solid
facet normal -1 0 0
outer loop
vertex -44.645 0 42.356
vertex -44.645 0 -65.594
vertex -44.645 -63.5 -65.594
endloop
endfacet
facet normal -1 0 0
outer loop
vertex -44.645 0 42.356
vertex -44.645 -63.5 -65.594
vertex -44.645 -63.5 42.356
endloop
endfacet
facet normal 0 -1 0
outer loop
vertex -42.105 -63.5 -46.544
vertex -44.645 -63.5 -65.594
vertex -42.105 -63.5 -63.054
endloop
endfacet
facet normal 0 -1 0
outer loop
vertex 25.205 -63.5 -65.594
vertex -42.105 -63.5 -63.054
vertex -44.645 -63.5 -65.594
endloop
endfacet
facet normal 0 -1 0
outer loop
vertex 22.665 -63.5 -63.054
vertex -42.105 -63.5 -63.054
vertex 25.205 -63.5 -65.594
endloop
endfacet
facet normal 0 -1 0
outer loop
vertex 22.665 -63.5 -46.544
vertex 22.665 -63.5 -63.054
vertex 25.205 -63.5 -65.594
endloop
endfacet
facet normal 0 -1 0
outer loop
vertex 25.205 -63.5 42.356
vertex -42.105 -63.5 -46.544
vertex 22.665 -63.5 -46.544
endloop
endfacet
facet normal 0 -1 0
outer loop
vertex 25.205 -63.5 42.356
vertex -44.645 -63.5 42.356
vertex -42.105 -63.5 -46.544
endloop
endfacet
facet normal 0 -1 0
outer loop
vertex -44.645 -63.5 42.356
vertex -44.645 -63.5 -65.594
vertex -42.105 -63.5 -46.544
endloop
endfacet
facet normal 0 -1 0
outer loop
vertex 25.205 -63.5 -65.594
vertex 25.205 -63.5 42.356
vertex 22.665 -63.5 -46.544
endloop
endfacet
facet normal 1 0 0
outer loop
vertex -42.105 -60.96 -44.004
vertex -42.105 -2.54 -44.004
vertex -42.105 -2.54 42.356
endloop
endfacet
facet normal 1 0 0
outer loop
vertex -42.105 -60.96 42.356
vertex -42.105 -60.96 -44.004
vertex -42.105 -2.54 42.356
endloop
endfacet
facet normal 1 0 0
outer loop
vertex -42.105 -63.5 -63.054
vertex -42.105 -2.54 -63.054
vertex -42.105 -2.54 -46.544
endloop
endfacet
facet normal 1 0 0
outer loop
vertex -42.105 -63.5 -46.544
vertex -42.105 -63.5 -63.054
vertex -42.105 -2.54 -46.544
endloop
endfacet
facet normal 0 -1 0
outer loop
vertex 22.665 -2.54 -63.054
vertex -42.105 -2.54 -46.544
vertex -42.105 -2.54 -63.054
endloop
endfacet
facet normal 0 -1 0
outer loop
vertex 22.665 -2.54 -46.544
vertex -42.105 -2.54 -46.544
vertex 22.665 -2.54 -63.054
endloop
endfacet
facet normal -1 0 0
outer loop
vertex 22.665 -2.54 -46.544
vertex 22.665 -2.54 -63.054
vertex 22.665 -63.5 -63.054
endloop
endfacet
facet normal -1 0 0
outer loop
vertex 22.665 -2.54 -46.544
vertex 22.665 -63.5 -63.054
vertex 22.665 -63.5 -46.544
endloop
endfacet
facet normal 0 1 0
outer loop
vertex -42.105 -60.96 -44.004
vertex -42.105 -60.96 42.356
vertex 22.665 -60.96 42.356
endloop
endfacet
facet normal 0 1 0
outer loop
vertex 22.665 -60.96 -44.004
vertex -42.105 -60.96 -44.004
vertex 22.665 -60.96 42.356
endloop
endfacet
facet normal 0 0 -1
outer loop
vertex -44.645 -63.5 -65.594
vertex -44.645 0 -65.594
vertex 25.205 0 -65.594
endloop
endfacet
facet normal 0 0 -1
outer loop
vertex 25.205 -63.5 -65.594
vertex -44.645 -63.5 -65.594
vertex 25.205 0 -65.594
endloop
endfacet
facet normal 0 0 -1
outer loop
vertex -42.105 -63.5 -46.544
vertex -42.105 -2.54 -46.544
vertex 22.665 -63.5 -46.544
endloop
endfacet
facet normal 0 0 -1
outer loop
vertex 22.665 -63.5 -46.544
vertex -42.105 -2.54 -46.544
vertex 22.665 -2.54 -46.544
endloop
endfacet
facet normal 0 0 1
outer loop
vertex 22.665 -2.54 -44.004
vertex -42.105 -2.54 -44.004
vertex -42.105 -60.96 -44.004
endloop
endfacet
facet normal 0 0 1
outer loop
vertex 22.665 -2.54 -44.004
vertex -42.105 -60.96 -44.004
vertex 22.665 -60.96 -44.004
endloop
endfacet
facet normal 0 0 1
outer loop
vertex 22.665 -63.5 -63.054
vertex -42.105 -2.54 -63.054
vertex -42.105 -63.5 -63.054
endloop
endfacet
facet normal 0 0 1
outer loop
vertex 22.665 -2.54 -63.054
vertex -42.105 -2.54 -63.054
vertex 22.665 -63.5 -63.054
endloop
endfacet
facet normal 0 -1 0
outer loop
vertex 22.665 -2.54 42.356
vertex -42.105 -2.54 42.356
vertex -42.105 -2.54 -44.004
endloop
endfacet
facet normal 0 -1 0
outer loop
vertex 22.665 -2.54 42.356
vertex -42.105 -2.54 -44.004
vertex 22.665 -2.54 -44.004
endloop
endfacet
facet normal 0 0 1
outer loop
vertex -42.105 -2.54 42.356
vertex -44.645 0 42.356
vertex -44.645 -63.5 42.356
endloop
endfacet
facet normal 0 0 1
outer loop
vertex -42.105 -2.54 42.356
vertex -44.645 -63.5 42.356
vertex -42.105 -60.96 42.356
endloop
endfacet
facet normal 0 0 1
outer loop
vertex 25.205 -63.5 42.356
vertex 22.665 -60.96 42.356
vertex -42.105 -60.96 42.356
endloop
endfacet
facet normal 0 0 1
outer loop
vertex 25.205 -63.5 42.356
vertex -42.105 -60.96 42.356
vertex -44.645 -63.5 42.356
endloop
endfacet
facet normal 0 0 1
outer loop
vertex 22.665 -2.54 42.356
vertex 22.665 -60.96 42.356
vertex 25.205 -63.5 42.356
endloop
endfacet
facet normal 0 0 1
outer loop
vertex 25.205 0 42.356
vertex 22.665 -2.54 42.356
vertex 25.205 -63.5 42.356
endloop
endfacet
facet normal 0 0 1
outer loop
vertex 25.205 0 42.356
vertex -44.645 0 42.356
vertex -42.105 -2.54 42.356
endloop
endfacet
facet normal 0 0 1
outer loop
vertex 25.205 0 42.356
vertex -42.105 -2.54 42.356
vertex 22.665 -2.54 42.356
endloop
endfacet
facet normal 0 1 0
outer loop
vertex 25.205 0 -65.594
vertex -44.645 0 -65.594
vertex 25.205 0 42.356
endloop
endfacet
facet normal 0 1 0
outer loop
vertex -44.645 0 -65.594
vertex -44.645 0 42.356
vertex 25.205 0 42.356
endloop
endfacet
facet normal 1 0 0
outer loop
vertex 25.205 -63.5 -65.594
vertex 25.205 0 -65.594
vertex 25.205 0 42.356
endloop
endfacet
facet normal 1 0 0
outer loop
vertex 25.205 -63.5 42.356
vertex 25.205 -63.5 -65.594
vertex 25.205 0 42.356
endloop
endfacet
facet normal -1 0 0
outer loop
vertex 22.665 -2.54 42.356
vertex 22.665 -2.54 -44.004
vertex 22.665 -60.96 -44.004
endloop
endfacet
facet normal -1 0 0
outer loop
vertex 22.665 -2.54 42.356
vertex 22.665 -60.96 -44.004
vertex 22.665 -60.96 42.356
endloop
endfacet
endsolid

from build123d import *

# Parameters (mm, degrees)
F0_W        = 69.85
F0_H        = 88.9
F1_DEPTH    = 63.5
F2_T        = -2.54
F0_H_2      = 19.05
F3_DEPTH    = 63.5
F4_T        = 2.54
F4_T3_DEPTH = 91.44
F4_T5_DEPTH = 69.85
F4_T7_DEPTH = 63.5


# Not quite as in the source:
# - a shell that OpenCascade refuses in one call is made with other operations: the cavity is built on its own and cut out


with BuildPart() as f1:
    # F0 (on Front) → F1 (new body)
    with BuildSketch(Plane.XZ):
        with Locations((-9.7199578146, -2.0941891145)):
            Rectangle(F0_W, F0_H)
    extrude(amount=F1_DEPTH)

    # F2
    f2_openings = [f1.faces().sort_by_distance(p)[0] for p in [
        (-9.719958, -31.75, 42.355811),
    ]]
    offset(amount=F2_T, openings=f2_openings)

    # F0 (on Front) → F3 (join)
    with BuildSketch(Plane.XZ):
        with Locations((-9.7199578146, -56.0691891145)):
            Rectangle(F0_W, F0_H_2)
    extrude(amount=F3_DEPTH)

    # F4: shell of thickness 2.54, made by hand


with BuildPart() as f4_core1:
    # F4_t2: copy of F1
    add(f1.part)

    # the walls: a layer under each face that stays
    f4_faces = [f4_core1.faces().sort_by_distance(p)[0] for p in [
        (-44.6449578146, -31.75, -11.6191891145),
        (-9.7199578146, 0, -11.6191891145),
        (25.2050421854, -31.75, -11.6191891145),
        (-9.7199578146, -31.75, -65.5941891145),
        (22.8767088521, -61.3833333333, 42.3558108855),
        (-9.7199578146, -60.96, -0.8241891145),
        (-9.7199578146, -31.75, -44.0041891145),
        (-42.1049578146, -31.75, -0.8241891145),
        (-9.7199578146, -2.54, -0.8241891145),
        (22.6650421854, -31.75, -0.8241891145),
    ]]
    thicken(f4_faces, amount=-F4_T, mode=Mode.SUBTRACT)

    # F4_s4 → F4_t3 (cut)
    with BuildSketch(Plane.XY.offset(-46.5441891145)):
        Polygon((-42.0795578146, -60.9346), (-42.1049578146, -63.5), (-44.6449578146, -63.5), (-44.6449578146, -60.96), align=None)
        Polygon((22.6396421854, -60.9346), (22.6650421854, -63.5), (25.2050421854, -63.5), (25.2050421854, -60.96), align=None)
        Polygon((-42.0795578146, -2.5654), (-44.6449578146, -2.54), (-44.6449578146, 0), (-42.1049578146, 0), align=None)
        Polygon((22.6396421854, -2.5654), (22.6650421854, 0), (25.2050421854, 0), (25.2050421854, -2.54), align=None)
    extrude(amount=F4_T3_DEPTH, mode=Mode.SUBTRACT)

    # F4_s6 → F4_t5 (cut)
    with BuildSketch(Plane.YZ.offset(-44.6449578146)):
        Polygon((-60.9346, -43.9787891145), (-63.5, -44.0041891145), (-63.5, -46.5441891145), (-60.96, -46.5441891145), align=None)
        Polygon((-2.5654, -43.9787891145), (-2.54, -46.5441891145), (0, -46.5441891145), (0, -44.0041891145), align=None)
    extrude(amount=F4_T5_DEPTH, mode=Mode.SUBTRACT)

    # F4_s8 → F4_t7 (cut)
    with BuildSketch(Plane.XZ):
        Polygon((22.6396421854, -43.9787891145), (22.6650421854, -46.5441891145), (25.2050421854, -46.5441891145), (25.2050421854, -44.0041891145), align=None)
        Polygon((-42.0795578146, -43.9787891145), (-42.1049578146, -46.5441891145), (-44.6449578146, -46.5441891145), (-44.6449578146, -44.0041891145), align=None)
    extrude(amount=F4_T7_DEPTH, mode=Mode.SUBTRACT)


with BuildPart() as f1_1:
    add(f1.part)

    # what is left inside the walls is the cavity
    f4_cavity = [f4_core1.part.solids().sort_by_distance(p)[0] for p in [
        (-9.719958, -43.18, -63.028789),
    ]]
    add(f4_cavity, mode=Mode.SUBTRACT)


solid = f1_1.part
